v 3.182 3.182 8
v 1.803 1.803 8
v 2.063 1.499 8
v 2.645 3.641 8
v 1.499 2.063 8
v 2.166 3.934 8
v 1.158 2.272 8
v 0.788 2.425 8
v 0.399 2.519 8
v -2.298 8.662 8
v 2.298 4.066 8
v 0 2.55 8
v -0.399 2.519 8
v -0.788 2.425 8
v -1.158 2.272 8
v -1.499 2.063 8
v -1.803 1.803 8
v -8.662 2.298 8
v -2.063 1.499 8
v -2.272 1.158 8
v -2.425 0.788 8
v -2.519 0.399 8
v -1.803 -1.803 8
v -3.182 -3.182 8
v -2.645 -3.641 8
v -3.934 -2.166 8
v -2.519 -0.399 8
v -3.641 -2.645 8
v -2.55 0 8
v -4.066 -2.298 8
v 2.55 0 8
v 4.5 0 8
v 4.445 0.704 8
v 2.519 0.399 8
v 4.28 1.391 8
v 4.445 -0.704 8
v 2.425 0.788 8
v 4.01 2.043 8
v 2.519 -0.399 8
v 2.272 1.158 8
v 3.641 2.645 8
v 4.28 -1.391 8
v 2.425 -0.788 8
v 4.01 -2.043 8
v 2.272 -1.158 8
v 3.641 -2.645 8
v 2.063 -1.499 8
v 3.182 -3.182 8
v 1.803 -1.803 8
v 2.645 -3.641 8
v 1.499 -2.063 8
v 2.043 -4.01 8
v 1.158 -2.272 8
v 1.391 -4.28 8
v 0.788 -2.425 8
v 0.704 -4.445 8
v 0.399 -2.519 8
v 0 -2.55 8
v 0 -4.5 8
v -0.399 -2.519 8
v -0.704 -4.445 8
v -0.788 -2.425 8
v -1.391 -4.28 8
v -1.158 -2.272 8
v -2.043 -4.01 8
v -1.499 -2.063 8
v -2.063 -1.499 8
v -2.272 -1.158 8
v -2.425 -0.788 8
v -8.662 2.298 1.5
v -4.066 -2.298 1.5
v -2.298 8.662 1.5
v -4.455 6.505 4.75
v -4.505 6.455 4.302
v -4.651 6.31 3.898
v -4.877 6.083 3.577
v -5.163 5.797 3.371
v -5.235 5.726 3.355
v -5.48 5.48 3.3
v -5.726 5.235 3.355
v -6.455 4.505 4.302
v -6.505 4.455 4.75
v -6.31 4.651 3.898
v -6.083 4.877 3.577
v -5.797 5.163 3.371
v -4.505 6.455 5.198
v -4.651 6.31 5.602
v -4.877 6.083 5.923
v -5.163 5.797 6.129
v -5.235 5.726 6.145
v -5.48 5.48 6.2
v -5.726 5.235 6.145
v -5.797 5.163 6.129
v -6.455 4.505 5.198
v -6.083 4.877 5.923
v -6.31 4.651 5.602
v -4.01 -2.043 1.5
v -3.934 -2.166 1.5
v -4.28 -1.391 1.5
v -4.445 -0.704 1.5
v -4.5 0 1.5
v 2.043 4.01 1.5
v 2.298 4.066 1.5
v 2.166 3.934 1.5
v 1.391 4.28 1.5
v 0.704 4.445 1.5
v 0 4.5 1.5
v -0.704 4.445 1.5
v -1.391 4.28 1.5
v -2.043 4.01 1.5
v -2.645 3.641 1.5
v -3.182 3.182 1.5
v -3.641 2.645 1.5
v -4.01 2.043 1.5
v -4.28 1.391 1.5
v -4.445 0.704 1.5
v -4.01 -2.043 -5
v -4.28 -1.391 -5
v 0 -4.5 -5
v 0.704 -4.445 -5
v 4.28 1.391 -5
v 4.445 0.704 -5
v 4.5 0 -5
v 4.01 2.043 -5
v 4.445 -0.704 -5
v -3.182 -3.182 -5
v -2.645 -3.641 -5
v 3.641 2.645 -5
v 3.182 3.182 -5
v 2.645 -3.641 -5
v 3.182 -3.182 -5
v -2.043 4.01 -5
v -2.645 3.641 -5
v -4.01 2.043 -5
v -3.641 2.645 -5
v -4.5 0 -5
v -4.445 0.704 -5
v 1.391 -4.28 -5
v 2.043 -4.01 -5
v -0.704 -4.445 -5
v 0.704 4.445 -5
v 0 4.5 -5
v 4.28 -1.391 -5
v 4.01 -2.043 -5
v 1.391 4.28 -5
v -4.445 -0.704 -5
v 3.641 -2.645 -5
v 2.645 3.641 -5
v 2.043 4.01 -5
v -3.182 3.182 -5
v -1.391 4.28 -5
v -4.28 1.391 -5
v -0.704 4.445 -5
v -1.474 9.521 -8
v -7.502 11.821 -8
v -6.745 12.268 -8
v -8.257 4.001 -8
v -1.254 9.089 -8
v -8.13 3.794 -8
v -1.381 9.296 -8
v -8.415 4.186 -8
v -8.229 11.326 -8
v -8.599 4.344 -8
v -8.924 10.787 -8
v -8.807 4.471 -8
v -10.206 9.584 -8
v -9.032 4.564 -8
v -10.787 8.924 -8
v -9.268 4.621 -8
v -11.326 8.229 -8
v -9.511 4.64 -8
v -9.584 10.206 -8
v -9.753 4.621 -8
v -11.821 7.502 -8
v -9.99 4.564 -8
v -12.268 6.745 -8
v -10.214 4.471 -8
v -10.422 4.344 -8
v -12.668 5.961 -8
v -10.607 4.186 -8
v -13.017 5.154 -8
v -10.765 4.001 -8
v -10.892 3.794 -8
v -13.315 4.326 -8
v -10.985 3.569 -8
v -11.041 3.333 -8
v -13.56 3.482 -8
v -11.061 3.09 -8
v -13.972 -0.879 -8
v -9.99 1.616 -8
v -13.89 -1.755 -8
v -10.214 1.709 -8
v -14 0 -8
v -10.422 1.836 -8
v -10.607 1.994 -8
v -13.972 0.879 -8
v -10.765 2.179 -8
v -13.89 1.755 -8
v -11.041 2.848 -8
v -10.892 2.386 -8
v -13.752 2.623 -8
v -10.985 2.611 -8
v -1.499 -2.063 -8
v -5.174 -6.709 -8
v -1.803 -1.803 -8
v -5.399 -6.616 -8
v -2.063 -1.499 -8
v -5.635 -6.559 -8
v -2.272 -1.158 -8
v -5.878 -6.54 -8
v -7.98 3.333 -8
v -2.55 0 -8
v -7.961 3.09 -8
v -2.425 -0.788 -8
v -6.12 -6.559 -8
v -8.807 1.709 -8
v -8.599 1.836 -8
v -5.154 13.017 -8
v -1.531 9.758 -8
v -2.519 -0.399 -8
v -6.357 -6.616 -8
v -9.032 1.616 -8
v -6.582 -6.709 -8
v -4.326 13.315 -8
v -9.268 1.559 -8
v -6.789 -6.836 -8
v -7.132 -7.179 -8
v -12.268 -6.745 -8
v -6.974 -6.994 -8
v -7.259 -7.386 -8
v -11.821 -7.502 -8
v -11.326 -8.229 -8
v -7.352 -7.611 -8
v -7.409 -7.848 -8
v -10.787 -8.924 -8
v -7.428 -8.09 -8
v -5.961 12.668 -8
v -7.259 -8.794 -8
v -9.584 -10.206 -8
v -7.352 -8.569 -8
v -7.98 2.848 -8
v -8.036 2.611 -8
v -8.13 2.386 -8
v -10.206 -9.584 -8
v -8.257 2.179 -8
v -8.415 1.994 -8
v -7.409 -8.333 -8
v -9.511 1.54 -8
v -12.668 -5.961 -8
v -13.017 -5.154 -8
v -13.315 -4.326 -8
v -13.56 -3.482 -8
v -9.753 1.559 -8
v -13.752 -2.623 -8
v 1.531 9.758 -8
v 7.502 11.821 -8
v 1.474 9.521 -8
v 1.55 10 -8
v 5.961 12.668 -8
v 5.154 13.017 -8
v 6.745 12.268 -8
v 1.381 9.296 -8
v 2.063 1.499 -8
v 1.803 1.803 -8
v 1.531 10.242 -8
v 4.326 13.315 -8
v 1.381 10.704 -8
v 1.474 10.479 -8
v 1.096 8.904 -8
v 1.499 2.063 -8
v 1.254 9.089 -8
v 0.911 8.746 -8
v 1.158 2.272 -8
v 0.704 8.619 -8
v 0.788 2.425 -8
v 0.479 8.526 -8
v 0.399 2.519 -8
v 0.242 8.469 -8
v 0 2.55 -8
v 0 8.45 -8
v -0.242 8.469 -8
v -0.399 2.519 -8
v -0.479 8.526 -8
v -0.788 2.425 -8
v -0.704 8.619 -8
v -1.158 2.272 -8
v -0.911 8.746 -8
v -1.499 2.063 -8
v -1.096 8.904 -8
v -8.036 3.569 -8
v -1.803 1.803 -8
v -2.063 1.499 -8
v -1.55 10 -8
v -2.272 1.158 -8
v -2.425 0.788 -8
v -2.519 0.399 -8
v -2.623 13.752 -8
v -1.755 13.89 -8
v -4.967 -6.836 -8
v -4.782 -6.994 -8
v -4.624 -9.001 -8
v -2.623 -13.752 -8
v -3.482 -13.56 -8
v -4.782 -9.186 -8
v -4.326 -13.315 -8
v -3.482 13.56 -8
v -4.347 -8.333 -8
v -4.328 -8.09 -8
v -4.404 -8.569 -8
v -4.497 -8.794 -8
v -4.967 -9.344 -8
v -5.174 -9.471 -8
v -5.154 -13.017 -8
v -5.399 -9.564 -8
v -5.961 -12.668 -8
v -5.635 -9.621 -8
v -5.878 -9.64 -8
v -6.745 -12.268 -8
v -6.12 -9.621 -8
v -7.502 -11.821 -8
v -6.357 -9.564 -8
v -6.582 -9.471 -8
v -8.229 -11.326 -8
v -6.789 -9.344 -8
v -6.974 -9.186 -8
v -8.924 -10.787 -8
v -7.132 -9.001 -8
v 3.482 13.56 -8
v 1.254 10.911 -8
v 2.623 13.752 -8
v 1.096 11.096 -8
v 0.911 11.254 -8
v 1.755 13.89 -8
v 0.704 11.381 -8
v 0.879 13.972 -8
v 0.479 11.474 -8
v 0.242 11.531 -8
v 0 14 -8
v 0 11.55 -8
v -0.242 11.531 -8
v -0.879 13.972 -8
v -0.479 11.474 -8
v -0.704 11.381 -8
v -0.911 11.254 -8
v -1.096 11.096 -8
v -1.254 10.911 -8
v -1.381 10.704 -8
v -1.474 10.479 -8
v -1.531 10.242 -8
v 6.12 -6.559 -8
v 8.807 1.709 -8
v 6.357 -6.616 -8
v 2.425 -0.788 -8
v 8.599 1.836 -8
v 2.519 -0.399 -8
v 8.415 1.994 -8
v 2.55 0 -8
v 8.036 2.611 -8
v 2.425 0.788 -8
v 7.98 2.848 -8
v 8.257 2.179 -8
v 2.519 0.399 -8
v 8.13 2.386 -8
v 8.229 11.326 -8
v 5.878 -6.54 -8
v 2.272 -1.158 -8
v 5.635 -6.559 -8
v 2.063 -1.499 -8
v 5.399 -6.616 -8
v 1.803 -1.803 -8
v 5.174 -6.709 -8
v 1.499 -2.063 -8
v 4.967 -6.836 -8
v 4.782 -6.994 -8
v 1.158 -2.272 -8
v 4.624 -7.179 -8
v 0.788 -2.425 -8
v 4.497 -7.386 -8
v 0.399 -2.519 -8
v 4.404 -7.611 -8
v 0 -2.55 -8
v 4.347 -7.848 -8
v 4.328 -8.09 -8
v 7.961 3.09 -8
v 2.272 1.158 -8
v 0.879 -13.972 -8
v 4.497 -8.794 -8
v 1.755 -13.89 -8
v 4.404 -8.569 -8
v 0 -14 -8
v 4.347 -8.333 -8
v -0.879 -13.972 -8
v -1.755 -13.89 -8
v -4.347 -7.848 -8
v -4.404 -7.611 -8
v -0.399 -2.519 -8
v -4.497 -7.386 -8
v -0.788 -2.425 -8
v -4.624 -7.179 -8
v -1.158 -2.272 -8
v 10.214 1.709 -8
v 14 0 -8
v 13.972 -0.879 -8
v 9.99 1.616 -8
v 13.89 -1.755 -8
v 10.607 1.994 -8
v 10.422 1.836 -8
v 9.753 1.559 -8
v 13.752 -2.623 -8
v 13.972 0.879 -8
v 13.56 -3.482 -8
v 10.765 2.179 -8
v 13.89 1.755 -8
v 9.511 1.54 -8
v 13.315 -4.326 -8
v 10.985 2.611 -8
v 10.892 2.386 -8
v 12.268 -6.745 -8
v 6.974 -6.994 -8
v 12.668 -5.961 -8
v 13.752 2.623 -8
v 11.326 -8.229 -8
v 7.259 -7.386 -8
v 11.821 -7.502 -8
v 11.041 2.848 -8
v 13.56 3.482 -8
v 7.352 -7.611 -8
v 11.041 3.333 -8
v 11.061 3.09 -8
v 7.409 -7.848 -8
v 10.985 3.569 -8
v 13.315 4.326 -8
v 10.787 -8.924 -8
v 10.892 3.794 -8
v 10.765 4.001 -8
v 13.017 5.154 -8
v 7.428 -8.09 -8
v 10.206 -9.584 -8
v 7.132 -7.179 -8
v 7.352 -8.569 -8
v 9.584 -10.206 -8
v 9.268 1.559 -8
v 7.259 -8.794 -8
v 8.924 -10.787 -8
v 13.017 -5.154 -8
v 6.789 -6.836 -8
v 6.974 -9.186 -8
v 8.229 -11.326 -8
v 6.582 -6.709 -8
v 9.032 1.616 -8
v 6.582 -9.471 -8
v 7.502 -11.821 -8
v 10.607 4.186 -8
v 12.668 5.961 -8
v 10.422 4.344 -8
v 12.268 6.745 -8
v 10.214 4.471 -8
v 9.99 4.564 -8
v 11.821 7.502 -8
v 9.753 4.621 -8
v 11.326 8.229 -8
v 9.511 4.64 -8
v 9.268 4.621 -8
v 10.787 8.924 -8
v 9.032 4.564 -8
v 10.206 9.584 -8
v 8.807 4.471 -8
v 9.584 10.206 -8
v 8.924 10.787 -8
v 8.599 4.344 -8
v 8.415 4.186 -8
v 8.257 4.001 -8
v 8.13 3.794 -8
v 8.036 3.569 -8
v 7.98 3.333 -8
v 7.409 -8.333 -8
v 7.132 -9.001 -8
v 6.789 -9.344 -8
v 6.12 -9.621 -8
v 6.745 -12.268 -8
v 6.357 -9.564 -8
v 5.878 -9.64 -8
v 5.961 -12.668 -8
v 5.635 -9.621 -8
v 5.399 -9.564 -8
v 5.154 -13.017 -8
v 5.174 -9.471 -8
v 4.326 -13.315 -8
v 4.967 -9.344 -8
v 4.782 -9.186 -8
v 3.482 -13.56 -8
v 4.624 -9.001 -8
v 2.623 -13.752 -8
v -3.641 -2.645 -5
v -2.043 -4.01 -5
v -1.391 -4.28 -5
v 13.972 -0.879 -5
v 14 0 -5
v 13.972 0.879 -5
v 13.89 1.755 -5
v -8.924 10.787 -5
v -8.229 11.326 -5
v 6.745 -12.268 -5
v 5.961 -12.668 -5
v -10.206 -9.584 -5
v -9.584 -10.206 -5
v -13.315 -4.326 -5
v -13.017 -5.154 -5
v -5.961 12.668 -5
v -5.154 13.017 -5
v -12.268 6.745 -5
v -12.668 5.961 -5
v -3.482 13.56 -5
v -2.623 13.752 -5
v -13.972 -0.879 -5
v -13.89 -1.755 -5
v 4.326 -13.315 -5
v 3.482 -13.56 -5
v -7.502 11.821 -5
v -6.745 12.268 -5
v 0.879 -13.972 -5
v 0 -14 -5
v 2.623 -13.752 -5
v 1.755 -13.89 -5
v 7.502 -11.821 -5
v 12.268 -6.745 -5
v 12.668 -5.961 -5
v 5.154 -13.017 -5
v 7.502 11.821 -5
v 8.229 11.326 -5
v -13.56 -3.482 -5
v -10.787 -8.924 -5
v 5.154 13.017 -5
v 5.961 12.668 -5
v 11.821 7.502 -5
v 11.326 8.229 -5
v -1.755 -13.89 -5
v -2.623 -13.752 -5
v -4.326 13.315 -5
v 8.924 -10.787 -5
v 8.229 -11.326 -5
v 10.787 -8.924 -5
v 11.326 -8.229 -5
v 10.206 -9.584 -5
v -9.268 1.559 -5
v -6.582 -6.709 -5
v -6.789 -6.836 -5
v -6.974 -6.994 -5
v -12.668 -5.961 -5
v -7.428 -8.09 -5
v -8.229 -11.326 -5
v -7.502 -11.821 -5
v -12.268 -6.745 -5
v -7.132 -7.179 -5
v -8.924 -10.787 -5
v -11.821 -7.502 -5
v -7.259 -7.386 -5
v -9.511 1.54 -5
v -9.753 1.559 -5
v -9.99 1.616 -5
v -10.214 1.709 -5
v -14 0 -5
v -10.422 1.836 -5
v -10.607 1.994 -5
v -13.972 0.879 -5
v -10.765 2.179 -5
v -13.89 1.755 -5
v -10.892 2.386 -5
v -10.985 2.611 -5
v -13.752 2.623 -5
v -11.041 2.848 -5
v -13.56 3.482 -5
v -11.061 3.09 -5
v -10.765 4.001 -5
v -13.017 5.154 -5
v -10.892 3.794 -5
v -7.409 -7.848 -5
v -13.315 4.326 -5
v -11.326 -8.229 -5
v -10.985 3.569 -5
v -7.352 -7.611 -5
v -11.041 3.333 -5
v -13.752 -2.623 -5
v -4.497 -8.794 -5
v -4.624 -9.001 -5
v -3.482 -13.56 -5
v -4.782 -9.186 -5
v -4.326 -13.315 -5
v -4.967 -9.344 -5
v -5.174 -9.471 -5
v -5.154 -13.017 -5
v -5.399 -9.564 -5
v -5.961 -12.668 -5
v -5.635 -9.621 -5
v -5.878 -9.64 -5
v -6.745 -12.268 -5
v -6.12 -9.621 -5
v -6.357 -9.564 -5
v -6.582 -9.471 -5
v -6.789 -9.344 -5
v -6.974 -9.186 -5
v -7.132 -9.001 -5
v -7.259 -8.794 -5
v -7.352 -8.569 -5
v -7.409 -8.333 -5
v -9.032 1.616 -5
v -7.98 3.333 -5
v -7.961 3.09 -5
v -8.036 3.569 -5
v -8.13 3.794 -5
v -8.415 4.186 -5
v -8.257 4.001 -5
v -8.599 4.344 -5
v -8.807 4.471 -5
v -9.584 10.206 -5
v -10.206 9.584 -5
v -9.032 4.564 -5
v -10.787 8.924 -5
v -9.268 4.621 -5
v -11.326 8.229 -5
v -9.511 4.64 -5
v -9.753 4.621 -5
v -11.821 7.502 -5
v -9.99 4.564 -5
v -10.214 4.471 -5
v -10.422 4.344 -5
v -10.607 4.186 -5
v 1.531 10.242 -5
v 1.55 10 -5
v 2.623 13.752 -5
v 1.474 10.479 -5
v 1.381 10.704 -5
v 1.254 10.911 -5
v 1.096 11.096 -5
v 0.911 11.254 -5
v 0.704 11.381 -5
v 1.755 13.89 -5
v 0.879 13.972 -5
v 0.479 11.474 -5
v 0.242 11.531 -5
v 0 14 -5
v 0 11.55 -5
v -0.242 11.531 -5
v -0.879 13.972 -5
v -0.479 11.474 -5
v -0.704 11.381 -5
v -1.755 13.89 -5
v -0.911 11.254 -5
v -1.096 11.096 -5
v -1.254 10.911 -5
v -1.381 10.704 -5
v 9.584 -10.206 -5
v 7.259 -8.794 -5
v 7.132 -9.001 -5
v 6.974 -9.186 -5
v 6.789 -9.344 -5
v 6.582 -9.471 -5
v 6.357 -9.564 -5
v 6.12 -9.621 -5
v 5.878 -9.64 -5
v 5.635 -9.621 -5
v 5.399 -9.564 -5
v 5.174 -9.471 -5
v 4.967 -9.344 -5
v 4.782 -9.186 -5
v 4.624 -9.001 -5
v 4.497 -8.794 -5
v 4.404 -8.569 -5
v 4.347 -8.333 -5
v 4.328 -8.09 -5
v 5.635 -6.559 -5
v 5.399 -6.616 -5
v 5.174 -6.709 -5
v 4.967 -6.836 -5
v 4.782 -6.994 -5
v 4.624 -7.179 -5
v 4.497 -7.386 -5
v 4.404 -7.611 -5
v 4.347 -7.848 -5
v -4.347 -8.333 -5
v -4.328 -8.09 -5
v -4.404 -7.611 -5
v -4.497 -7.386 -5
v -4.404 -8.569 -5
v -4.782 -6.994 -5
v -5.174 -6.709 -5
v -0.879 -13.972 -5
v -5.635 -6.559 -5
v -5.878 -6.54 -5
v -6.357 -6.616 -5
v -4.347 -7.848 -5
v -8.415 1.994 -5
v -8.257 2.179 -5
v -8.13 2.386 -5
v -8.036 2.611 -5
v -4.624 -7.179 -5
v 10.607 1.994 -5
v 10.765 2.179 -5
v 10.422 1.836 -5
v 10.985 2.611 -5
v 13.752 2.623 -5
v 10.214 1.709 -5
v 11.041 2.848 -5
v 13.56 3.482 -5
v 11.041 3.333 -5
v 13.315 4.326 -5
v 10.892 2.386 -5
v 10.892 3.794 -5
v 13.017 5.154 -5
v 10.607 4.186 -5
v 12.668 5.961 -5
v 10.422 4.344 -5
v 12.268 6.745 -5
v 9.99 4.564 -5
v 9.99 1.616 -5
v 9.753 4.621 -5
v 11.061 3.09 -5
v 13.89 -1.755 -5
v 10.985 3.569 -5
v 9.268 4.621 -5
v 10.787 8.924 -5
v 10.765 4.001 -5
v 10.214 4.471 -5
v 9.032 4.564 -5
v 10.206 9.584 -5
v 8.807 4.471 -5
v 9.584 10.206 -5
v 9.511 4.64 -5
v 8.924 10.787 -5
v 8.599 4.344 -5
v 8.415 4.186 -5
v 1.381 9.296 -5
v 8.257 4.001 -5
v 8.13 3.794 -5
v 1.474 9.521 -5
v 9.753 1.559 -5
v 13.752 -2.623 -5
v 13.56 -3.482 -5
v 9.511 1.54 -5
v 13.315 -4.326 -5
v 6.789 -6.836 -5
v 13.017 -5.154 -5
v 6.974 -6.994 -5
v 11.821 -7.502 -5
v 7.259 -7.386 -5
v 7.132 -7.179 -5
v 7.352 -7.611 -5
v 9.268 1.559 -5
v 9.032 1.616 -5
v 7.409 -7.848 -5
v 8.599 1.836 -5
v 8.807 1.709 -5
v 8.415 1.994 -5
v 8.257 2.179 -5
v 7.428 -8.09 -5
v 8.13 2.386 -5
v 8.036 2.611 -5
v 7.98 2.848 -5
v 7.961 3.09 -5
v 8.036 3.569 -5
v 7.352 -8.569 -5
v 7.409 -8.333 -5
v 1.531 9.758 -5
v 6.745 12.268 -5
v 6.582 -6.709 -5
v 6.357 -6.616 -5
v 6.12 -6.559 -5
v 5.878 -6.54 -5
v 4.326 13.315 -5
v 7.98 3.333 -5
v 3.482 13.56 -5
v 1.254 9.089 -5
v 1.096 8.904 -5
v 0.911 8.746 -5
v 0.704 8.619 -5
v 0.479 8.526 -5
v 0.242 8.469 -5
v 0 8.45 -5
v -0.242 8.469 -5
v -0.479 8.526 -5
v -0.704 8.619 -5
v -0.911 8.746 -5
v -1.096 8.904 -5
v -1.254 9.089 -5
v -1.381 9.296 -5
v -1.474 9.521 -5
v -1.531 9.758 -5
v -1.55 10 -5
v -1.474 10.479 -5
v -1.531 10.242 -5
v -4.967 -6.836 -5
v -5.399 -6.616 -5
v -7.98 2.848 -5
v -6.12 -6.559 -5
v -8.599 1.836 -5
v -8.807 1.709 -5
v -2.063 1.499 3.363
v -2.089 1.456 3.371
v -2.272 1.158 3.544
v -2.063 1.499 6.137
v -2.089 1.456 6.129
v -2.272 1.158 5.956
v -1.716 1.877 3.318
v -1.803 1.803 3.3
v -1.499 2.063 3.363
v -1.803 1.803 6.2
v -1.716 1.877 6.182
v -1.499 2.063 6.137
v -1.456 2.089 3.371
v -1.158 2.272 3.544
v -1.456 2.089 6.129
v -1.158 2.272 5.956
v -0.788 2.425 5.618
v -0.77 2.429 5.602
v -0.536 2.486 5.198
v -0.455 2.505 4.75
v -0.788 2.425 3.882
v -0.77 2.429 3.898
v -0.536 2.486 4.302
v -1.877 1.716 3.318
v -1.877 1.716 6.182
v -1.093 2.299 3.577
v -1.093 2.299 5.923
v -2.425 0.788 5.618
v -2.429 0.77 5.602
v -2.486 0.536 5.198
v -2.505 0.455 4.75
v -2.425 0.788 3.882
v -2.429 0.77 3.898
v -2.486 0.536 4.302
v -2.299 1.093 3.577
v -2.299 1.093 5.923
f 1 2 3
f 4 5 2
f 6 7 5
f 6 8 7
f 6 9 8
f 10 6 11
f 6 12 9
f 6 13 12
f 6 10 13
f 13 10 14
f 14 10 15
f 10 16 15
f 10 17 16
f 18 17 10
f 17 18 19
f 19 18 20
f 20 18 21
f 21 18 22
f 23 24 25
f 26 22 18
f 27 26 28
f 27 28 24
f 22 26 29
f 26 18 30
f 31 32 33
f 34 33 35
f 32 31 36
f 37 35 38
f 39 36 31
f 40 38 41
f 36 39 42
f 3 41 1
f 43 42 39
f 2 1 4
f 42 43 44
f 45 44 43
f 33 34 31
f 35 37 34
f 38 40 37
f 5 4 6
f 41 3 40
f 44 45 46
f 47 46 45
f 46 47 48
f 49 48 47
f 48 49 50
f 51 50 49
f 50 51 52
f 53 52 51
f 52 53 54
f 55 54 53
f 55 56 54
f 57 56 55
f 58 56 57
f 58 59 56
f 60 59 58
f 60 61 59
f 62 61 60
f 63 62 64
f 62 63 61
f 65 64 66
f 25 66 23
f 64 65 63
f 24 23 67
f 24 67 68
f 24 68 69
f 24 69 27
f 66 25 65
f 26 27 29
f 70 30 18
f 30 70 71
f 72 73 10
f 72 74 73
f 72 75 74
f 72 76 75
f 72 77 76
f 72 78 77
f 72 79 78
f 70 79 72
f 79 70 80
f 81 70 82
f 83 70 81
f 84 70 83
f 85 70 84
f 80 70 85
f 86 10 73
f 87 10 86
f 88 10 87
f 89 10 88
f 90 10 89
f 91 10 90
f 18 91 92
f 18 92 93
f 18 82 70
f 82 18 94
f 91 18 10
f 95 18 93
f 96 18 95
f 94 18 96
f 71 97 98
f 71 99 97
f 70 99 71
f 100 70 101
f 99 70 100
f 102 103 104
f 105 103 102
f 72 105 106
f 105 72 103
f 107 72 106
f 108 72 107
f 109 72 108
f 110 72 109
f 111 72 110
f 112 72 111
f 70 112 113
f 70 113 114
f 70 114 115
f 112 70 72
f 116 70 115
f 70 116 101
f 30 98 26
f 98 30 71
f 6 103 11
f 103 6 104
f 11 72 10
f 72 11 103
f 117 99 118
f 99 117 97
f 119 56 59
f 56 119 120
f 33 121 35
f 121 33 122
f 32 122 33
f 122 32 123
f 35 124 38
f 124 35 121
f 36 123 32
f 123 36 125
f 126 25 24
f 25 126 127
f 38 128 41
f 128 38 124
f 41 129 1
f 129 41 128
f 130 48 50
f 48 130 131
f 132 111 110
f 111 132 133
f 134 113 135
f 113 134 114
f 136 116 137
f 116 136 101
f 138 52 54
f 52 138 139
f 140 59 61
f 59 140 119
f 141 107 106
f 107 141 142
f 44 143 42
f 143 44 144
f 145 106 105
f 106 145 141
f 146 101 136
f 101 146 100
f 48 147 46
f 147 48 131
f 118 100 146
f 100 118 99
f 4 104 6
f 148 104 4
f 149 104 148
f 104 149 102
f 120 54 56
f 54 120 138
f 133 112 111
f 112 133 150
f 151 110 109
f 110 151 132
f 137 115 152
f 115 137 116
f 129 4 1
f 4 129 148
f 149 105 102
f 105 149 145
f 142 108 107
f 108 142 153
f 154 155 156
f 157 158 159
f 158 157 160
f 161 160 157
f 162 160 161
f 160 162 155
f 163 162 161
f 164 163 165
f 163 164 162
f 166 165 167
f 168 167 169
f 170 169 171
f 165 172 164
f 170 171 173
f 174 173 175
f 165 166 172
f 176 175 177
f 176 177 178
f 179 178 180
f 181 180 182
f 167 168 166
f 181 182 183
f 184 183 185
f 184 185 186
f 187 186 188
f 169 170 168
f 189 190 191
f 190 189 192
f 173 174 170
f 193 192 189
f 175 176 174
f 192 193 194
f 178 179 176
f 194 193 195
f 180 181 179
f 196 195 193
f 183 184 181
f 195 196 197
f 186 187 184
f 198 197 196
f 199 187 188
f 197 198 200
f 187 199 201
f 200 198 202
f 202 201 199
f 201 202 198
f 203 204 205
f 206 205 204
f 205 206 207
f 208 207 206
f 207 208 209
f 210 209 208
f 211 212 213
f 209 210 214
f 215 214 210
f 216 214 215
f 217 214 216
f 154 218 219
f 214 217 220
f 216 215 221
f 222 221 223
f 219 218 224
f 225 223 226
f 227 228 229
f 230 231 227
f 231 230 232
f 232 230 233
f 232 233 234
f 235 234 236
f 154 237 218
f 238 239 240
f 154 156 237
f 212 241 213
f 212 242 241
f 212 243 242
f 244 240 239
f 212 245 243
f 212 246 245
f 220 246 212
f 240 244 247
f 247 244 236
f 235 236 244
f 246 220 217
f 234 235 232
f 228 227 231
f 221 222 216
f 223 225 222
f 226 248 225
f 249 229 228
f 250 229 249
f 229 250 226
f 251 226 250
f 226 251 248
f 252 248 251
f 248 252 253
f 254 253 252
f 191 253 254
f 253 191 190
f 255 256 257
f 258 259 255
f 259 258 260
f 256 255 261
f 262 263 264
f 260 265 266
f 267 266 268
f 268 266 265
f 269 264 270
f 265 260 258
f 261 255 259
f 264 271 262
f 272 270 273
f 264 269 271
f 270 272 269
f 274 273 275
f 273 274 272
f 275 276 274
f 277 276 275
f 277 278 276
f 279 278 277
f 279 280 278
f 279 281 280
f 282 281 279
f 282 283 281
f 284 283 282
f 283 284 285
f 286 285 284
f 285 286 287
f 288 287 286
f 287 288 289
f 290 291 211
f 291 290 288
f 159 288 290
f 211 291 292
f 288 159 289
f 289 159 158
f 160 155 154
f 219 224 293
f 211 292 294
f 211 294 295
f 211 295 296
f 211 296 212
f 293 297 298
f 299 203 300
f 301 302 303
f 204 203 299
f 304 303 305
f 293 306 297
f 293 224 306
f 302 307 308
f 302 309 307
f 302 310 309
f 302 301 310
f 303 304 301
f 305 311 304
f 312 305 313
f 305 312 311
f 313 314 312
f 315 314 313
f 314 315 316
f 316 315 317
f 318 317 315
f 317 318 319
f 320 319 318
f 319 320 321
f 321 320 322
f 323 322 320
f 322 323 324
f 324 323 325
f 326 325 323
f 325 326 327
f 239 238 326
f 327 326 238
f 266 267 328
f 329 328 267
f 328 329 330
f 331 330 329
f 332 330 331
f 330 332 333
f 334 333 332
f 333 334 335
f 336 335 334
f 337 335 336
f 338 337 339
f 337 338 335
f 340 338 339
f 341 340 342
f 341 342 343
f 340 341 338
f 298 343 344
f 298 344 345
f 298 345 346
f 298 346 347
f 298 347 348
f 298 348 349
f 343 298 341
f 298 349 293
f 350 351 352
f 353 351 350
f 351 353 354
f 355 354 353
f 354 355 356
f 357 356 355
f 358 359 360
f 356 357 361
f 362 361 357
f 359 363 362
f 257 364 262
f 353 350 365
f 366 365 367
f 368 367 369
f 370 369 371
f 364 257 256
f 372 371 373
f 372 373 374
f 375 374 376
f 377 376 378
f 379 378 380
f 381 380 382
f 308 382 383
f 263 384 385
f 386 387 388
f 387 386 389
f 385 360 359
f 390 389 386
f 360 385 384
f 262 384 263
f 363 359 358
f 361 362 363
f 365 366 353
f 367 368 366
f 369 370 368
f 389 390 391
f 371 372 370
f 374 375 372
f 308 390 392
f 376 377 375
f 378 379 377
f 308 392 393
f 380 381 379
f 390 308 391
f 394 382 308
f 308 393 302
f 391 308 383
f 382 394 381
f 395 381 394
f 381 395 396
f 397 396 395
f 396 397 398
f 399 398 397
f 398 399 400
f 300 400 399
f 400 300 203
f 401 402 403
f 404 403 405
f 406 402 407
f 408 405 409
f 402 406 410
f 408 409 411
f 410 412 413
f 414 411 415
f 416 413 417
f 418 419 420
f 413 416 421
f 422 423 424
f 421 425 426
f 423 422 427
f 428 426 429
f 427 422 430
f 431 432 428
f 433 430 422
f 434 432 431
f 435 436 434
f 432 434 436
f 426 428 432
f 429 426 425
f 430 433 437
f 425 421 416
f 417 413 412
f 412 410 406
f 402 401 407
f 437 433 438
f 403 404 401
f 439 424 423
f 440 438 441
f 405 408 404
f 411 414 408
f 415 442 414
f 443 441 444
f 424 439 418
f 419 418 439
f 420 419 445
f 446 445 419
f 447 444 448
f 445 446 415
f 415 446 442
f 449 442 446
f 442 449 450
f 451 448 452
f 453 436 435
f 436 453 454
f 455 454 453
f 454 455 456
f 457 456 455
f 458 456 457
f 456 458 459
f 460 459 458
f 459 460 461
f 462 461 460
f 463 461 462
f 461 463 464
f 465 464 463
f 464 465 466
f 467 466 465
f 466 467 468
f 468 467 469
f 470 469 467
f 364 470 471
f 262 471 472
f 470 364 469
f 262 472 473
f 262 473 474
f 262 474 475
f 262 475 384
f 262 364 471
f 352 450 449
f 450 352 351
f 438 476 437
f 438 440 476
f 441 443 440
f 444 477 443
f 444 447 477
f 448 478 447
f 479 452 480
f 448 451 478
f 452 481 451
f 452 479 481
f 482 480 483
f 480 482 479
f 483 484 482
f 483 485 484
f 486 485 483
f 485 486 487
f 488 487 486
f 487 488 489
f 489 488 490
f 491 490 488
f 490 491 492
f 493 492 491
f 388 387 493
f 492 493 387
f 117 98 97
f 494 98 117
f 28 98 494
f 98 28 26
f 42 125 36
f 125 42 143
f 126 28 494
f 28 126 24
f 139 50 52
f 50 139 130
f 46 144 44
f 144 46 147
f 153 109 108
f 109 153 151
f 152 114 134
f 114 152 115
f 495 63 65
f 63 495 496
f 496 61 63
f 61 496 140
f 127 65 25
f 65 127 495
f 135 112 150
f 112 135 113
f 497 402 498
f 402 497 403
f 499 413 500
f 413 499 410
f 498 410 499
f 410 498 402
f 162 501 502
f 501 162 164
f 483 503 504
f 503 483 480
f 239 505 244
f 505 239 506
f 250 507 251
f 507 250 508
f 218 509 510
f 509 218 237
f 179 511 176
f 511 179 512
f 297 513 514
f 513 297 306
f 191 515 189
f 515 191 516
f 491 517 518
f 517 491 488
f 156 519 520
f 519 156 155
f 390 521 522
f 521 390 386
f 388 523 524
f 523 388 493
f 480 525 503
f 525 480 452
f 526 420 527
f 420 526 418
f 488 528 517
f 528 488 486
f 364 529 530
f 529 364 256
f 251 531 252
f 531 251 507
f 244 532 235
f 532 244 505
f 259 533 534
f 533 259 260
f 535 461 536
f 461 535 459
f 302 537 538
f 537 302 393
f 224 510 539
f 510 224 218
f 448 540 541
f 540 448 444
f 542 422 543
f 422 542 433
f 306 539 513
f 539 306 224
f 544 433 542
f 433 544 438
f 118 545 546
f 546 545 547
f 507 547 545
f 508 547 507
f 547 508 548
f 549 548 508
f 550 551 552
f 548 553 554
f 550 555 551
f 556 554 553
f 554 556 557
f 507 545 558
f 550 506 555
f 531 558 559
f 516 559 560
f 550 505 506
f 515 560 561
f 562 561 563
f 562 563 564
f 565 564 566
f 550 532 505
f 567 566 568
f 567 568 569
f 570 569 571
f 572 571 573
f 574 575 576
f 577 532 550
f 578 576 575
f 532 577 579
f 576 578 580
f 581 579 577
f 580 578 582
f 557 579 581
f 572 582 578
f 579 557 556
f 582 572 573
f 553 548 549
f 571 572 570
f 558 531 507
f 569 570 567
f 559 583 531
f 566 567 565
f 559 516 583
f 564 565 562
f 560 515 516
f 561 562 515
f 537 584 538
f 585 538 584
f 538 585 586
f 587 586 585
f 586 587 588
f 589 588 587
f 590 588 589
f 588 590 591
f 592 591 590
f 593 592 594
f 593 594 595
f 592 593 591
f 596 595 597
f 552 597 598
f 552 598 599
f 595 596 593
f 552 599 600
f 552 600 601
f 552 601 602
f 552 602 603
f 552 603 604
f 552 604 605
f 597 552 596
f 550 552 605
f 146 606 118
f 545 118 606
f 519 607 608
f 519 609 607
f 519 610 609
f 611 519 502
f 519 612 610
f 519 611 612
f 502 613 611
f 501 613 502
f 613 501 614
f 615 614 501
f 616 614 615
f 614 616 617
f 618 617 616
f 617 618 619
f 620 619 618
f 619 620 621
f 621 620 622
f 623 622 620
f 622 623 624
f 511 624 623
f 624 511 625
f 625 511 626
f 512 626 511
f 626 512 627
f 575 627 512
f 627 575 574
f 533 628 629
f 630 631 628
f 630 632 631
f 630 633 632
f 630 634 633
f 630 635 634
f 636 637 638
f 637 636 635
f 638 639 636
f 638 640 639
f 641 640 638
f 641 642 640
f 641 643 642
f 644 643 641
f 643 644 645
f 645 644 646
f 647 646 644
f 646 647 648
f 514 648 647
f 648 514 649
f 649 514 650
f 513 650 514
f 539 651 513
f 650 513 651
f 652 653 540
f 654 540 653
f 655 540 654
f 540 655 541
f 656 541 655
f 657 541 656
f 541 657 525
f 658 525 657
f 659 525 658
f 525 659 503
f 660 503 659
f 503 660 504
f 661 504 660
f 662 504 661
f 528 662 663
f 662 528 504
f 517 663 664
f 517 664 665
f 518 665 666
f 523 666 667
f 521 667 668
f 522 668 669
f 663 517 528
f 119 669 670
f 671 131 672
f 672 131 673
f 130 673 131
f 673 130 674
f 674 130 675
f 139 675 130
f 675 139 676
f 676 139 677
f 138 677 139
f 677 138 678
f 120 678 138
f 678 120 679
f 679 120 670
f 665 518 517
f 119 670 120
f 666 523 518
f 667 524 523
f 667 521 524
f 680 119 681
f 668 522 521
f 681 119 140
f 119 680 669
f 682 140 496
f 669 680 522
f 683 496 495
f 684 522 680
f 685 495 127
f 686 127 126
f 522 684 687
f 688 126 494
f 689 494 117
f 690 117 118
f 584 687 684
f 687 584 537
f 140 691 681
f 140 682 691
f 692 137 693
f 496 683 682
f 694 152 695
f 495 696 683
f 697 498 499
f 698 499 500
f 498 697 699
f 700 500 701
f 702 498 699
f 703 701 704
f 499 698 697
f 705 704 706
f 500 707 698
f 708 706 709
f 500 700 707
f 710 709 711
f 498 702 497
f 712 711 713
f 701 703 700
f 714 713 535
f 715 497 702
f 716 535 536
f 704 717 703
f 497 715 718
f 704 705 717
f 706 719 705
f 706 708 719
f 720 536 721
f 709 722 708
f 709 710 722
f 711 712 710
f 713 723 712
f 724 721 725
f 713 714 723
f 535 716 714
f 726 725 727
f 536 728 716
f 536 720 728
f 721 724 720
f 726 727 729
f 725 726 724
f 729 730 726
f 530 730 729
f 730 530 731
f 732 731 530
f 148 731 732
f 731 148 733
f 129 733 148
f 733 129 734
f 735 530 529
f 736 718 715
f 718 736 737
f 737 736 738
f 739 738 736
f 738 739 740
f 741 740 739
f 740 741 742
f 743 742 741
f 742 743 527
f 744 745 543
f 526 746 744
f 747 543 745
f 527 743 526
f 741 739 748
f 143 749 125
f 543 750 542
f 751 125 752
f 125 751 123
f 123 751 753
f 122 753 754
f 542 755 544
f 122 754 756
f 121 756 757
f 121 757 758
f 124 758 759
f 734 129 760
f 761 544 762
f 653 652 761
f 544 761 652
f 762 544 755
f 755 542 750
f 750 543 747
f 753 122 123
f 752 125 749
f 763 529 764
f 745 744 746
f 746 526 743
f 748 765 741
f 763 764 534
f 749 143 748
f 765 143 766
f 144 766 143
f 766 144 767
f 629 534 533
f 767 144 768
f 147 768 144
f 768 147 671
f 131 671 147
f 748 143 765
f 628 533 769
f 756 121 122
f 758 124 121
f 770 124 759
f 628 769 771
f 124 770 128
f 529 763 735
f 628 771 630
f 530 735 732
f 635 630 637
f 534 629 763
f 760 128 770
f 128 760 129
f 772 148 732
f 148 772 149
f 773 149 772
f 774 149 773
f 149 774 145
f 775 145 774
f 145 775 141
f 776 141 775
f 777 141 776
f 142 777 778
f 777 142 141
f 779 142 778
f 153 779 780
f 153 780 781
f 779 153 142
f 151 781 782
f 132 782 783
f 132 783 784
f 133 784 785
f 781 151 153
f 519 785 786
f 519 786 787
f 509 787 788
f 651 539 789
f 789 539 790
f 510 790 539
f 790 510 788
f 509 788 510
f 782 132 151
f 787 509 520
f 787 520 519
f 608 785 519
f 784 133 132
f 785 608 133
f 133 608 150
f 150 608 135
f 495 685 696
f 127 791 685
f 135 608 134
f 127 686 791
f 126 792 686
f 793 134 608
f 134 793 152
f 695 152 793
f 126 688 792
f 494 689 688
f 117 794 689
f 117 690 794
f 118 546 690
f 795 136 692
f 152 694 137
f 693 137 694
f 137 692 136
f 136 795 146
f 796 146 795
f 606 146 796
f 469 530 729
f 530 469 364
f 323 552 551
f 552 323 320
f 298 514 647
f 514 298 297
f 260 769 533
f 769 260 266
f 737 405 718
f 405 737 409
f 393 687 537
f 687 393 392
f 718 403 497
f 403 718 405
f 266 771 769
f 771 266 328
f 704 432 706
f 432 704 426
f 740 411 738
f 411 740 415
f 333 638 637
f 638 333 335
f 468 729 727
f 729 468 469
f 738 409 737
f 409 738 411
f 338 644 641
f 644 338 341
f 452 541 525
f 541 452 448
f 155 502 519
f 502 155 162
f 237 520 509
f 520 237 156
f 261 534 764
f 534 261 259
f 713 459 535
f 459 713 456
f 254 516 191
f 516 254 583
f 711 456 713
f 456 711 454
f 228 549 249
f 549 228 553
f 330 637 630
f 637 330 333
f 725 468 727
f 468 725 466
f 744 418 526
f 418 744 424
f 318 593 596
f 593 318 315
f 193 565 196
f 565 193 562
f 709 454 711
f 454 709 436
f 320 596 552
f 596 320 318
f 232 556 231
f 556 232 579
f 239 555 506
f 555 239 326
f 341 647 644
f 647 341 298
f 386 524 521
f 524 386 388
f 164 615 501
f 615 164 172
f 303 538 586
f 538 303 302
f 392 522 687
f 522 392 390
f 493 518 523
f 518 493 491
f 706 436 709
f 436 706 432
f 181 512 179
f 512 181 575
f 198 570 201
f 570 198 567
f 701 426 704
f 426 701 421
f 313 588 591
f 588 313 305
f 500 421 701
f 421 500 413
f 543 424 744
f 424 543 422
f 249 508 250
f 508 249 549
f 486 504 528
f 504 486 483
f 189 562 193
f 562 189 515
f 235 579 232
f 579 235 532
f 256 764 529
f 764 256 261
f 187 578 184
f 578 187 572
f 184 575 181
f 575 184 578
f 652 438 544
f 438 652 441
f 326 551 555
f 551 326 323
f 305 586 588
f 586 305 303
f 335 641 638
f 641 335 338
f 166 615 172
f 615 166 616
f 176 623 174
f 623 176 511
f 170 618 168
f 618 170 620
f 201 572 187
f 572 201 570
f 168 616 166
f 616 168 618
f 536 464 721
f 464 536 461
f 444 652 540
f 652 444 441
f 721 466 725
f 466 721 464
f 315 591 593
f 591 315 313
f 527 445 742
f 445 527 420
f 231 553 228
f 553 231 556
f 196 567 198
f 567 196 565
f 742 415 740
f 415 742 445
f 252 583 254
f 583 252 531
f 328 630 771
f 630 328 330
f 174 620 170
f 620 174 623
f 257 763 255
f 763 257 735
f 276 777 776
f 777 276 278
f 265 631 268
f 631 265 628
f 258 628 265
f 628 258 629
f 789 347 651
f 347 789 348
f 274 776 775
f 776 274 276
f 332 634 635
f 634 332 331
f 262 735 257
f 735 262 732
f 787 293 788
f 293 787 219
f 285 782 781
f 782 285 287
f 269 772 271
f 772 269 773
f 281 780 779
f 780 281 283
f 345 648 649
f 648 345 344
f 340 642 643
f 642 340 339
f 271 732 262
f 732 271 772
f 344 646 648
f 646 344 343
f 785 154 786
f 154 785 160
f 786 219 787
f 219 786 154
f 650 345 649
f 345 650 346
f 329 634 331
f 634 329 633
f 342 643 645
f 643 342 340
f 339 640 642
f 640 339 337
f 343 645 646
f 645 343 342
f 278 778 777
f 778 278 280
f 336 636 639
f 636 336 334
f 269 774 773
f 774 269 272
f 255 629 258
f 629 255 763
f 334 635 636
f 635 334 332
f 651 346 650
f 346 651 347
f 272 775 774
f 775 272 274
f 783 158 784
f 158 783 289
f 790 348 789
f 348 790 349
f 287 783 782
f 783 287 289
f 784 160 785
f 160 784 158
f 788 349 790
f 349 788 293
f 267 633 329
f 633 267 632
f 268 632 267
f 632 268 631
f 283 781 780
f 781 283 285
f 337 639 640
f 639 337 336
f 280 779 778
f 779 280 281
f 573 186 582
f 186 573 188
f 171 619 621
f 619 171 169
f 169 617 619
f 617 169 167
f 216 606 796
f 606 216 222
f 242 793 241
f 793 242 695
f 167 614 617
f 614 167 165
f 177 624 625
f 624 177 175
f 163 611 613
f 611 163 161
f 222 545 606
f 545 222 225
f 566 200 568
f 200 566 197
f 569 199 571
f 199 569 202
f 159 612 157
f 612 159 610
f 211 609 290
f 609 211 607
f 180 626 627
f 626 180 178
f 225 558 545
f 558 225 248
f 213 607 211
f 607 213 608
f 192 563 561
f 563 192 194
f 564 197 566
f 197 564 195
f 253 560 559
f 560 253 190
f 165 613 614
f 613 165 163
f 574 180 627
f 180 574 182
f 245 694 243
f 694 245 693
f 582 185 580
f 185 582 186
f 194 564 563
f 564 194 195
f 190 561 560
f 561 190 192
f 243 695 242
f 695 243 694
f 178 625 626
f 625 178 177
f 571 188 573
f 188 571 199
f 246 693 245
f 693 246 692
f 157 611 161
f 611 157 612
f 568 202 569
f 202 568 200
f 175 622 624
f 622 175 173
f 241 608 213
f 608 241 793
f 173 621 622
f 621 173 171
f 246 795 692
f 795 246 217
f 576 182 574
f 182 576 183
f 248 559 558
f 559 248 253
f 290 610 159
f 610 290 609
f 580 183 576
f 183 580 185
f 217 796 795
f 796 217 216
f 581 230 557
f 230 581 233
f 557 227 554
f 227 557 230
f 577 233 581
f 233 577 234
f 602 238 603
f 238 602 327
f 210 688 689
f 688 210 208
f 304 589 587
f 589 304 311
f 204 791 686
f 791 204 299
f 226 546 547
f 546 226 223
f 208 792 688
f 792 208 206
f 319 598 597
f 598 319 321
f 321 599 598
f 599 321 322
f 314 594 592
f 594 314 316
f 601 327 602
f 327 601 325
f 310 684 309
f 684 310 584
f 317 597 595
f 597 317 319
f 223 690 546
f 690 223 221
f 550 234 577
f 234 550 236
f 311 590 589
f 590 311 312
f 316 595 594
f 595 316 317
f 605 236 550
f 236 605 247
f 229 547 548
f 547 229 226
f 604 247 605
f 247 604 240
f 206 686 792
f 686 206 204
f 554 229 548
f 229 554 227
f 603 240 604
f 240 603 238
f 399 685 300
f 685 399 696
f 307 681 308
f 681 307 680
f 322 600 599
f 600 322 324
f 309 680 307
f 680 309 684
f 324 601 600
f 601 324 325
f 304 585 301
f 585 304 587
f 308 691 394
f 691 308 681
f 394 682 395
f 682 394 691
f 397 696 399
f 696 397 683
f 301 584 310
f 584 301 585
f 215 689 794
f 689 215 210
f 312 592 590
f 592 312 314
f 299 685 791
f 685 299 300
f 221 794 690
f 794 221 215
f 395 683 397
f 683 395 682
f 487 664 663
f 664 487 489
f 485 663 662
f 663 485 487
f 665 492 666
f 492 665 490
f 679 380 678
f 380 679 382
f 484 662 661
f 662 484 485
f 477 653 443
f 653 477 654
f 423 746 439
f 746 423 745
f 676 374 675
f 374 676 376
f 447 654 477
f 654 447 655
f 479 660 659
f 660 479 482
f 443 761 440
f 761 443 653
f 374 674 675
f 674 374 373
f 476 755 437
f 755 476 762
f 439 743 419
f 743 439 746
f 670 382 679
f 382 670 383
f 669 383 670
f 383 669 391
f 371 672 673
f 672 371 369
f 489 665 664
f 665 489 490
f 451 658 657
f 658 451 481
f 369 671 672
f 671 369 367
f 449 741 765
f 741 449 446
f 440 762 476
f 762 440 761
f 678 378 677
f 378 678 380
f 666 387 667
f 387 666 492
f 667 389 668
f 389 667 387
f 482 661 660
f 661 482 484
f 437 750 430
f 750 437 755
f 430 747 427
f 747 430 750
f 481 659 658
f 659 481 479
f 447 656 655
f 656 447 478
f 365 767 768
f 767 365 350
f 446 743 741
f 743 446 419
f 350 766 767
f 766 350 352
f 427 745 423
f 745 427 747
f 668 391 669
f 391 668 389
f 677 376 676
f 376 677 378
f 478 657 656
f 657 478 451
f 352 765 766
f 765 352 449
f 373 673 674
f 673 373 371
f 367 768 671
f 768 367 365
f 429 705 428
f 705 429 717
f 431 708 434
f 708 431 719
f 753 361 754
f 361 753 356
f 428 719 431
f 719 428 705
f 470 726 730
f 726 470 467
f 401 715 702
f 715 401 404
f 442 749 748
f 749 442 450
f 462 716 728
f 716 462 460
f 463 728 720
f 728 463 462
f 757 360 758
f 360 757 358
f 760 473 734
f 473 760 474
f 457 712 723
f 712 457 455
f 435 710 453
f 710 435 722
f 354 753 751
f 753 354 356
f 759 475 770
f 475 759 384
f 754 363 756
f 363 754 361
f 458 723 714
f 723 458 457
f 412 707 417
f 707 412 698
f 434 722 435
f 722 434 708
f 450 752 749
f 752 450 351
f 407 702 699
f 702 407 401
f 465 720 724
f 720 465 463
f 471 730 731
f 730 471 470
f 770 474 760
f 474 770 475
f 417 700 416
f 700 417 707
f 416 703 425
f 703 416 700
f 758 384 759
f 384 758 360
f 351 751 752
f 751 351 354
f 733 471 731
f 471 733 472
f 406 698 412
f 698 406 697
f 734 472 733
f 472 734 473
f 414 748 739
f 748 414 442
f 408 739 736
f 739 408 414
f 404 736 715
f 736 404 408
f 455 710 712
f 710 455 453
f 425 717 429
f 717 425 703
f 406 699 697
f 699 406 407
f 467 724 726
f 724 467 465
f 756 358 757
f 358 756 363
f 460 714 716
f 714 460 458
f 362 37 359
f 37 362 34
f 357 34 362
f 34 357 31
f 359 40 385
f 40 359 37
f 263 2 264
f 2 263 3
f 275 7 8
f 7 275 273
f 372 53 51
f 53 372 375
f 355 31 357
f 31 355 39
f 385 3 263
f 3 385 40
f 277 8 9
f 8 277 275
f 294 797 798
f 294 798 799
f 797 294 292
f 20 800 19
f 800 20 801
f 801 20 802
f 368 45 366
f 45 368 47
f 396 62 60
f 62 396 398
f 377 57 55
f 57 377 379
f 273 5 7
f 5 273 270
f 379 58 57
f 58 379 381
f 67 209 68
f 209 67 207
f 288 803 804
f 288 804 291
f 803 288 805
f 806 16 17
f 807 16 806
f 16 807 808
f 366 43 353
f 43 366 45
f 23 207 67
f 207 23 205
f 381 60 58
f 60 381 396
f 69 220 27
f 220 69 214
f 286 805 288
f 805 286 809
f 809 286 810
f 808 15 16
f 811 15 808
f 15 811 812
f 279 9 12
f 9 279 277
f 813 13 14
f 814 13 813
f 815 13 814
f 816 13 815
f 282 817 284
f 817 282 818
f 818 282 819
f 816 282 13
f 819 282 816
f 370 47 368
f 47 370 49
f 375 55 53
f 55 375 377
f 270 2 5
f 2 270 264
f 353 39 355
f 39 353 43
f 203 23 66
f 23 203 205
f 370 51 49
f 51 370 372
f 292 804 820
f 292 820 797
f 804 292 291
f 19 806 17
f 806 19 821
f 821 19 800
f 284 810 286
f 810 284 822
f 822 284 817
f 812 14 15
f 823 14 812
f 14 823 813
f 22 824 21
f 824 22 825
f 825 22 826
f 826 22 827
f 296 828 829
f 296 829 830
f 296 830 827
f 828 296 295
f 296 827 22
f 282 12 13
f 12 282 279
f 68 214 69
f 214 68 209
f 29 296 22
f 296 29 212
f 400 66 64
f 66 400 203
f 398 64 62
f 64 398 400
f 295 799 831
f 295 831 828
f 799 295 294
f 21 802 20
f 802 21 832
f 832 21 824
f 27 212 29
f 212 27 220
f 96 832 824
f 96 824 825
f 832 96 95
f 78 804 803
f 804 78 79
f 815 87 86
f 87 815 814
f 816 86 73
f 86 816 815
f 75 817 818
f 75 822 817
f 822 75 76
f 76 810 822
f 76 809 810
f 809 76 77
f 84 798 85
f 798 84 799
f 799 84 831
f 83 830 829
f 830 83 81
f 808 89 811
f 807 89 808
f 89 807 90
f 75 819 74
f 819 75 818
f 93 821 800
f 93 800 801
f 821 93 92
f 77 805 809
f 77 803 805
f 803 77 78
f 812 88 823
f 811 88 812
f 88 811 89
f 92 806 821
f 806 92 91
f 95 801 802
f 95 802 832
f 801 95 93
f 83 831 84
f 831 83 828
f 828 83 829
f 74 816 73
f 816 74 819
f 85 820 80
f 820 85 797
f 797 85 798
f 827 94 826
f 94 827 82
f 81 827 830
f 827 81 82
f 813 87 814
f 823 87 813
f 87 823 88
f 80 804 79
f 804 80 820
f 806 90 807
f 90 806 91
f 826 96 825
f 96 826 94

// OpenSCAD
heightpump=16;
radiusoutcyl=25;
radiushole=15;
radiusholebig=19;
radiusoutcylbig=30;
heightscrewcube=20;
widthscrewcube=22;
screwdistancefromborder=4;
tuberadius=2.2;
tubeposition=2;
skirtthickness=3;
skirtradius=radiushole-2;
screwradius=1.55;
separazione=-10;
enterangle=35;
//rotor
radiusmotorshaft=2.55;
h_uppershaft=0;
distancefromcenter=10;
numberofnuts=5;
thickness_rotor=3;
radiusrotorshaft=4.5;
boxscrew=radiusrotorshaft+2;

//rotor
difference(){
union(){
rotate([0,0,45])
translate([0,radiusrotorshaft,-heightpump/2+h_uppershaft+heightpump-boxscrew/2])cube([radiusrotorshaft*2,boxscrew,boxscrew],center=true);
translate([0,0,h_uppershaft/2]) cylinder(h=heightpump+h_uppershaft,r=radiusrotorshaft,$fn=40,center=true);
translate([0,0,-heightpump/2]){
cylinder(h=thickness_rotor,r=radiushole-1,$fn=100);
}
}
translate([0,0,-heightpump/2]){    
for (a =[0:360/numberofnuts:360]){    
    rotate([0,0,a]) 
translate([0,distancefromcenter,h_uppershaft/2]) cylinder(h=heightpump+h_uppershaft,r=screwradius,$fn=40,center=true);
}
}
cylinder(h=(heightpump+h_uppershaft)*2,r=radiusmotorshaft,$fn=40,center=true);
rotate([0,0,45])
translate([0,5,-heightpump/2+h_uppershaft+heightpump-boxscrew/2])
 rotate([90,0,0])
    color("blue") cylinder(h=10,r=screwradius-0.1,center=true,$fn=20);
}
